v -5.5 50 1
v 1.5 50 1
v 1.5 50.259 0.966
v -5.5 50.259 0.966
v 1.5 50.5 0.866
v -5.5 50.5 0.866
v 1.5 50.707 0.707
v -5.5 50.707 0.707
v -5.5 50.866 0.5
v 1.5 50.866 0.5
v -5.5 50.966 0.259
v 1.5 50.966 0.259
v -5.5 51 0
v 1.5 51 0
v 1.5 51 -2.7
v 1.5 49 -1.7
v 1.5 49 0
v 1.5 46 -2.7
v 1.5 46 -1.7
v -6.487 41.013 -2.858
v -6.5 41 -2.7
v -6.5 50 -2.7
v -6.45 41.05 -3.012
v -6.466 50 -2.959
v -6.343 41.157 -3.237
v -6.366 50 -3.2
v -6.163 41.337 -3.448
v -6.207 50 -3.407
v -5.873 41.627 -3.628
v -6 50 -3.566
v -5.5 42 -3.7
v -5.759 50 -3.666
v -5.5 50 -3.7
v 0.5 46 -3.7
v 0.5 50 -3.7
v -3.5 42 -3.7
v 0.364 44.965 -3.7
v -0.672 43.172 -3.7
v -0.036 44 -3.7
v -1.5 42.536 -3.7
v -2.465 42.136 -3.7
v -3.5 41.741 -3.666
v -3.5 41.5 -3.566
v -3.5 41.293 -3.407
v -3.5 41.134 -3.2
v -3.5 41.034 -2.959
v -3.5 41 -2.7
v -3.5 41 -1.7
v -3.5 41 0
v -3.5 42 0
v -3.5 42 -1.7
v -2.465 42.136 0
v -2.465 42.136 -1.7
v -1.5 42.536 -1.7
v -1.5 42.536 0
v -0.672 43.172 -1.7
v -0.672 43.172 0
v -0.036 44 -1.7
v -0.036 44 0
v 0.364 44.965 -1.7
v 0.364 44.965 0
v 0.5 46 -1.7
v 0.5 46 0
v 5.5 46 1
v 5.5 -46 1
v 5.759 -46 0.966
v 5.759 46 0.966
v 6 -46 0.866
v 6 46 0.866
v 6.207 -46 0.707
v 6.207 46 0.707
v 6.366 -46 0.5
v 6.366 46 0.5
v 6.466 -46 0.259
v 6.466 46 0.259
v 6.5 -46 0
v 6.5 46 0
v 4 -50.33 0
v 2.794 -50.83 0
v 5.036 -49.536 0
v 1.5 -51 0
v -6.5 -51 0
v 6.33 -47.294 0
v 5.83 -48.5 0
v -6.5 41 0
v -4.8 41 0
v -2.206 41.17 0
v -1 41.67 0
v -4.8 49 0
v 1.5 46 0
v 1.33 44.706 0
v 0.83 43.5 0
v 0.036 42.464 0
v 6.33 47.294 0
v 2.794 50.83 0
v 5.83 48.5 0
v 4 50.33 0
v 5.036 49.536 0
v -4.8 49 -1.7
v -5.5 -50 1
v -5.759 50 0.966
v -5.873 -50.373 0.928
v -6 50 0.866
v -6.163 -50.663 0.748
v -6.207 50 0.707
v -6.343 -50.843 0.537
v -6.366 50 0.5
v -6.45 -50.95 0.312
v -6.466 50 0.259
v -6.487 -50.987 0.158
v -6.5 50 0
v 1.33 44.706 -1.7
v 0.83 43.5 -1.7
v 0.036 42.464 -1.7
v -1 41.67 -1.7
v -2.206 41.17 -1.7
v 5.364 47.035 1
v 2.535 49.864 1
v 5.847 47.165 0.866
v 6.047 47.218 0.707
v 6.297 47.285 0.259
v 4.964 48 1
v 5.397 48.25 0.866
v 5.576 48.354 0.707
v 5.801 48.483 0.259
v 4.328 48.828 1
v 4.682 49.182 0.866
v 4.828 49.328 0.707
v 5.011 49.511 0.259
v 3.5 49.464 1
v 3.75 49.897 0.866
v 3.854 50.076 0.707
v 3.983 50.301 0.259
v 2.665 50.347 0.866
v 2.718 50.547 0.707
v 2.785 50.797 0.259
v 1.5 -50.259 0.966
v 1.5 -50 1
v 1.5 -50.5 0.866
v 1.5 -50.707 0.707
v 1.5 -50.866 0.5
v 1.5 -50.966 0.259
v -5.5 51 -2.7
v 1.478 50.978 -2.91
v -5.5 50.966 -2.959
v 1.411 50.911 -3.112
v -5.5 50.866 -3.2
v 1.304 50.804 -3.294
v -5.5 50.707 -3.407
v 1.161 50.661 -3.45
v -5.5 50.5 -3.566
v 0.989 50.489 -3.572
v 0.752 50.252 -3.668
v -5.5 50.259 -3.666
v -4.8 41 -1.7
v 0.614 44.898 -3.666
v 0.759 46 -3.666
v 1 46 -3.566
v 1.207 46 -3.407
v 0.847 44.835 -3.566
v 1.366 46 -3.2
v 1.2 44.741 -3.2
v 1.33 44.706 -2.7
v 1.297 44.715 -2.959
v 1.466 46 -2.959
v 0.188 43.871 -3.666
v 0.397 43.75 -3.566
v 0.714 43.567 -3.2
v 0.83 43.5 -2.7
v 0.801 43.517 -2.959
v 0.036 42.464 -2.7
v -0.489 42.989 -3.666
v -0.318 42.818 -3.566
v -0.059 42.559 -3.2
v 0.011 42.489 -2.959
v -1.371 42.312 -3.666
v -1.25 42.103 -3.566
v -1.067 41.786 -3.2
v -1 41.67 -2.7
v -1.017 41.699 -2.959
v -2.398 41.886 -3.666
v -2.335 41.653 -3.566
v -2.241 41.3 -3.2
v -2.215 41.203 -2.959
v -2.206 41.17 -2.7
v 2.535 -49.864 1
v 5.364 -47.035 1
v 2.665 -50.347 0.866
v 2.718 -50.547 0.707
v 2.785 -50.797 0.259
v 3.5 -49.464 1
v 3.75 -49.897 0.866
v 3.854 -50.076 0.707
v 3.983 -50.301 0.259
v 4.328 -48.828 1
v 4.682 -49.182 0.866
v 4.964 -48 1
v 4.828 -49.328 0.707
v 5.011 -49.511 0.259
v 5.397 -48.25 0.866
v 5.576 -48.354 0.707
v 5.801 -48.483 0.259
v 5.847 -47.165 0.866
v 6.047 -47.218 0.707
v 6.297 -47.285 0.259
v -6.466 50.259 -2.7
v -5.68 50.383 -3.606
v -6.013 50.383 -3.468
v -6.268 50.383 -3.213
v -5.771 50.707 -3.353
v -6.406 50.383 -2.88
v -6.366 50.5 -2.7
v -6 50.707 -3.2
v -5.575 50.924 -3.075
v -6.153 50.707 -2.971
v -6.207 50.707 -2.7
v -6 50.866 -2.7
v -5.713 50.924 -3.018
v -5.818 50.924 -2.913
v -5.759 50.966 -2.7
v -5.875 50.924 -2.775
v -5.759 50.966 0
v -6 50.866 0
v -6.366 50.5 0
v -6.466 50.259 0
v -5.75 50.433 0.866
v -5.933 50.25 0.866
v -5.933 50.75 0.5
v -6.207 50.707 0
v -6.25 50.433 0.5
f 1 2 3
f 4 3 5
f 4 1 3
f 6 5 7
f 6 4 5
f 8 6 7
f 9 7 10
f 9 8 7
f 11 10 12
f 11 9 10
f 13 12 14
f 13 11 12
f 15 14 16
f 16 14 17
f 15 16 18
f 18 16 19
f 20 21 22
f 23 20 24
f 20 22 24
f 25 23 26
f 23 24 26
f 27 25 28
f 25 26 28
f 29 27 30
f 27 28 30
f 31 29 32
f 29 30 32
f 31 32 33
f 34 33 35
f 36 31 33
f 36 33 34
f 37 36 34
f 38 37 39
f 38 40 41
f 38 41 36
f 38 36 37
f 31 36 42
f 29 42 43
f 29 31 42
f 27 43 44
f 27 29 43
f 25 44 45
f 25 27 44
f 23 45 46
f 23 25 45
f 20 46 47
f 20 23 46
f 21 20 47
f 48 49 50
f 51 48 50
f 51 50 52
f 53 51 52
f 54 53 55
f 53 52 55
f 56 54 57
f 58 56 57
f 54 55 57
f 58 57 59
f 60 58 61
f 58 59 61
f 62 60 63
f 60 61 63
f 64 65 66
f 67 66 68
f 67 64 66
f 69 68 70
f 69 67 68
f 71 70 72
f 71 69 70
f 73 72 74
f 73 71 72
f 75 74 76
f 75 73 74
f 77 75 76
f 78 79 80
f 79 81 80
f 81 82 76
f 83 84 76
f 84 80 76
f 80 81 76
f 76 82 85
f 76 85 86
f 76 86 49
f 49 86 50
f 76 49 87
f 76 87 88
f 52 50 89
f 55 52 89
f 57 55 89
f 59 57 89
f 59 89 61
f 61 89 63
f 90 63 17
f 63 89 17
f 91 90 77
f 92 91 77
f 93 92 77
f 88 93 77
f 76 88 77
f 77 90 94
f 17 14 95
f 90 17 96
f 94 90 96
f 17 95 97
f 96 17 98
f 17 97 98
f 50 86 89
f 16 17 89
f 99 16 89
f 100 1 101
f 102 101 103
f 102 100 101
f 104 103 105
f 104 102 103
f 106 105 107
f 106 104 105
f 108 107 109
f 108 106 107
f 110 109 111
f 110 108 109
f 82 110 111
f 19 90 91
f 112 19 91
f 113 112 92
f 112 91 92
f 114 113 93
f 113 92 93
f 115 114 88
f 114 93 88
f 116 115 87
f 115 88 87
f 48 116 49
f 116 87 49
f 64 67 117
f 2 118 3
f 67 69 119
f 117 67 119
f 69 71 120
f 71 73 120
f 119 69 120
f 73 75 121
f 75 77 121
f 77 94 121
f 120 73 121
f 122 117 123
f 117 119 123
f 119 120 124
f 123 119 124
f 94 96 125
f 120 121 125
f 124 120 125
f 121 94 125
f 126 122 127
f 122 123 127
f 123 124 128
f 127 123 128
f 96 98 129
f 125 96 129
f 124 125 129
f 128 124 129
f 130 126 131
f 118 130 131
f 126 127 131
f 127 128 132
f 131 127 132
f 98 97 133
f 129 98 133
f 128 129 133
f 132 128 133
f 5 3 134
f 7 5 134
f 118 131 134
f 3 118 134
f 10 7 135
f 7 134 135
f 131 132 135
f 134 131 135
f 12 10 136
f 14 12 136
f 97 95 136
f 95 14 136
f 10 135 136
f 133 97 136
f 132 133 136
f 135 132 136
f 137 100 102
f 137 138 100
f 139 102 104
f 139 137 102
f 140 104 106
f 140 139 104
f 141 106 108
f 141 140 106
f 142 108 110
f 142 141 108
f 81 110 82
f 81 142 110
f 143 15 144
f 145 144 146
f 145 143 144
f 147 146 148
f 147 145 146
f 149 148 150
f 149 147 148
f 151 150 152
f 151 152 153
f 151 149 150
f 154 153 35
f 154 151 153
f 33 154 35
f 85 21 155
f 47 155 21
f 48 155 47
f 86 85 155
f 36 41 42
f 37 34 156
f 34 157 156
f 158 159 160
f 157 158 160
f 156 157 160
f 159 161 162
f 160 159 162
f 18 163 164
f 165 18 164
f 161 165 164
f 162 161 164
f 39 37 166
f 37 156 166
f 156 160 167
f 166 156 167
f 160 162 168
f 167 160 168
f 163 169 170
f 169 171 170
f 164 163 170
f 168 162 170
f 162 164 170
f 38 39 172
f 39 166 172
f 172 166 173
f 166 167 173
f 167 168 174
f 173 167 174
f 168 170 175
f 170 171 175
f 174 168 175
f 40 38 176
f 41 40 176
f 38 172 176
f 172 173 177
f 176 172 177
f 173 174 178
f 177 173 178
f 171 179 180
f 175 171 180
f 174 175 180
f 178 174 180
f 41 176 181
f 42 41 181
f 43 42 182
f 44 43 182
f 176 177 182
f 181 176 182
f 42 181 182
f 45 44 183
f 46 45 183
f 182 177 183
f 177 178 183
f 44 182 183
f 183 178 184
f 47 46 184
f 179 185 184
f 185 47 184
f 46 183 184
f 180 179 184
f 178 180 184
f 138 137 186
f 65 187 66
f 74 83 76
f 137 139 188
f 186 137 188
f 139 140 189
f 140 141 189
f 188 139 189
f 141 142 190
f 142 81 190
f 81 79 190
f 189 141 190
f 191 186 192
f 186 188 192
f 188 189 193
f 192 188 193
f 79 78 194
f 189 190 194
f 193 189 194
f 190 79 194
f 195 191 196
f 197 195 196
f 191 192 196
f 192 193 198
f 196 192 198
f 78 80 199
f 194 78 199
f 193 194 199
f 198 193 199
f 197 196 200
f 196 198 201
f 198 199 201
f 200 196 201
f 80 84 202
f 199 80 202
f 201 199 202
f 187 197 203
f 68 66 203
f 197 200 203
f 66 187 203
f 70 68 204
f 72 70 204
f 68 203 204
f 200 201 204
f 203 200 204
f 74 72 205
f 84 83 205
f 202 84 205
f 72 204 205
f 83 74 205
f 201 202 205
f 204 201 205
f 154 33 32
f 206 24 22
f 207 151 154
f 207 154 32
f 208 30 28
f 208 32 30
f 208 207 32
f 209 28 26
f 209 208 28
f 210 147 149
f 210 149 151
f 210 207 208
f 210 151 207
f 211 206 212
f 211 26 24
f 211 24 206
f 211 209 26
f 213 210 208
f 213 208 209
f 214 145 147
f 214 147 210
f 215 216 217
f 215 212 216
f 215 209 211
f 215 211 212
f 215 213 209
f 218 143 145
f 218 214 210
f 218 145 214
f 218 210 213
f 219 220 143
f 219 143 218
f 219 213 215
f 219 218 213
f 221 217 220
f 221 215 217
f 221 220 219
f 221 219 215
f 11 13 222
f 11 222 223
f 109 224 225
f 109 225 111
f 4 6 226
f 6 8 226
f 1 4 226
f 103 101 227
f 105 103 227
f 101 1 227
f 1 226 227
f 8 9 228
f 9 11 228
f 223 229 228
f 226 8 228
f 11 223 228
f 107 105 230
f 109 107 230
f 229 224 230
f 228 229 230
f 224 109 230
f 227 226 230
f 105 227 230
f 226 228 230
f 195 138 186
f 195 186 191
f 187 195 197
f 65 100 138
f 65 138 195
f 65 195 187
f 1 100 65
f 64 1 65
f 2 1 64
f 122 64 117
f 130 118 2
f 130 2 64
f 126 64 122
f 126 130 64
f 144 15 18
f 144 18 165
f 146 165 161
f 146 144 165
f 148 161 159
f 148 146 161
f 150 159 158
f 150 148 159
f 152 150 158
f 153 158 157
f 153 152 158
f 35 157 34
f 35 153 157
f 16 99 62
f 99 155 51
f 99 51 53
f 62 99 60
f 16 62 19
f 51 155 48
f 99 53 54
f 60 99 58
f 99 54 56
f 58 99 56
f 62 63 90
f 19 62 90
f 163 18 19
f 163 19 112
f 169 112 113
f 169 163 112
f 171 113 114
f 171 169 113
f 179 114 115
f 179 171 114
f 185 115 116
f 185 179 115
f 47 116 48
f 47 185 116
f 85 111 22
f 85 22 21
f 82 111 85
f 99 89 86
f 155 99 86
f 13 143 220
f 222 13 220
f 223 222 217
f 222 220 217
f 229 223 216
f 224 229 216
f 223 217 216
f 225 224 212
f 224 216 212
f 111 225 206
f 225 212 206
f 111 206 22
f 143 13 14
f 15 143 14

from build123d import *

# Parameters (mm, degrees)
F1_DEPTH     = 1
F2_W         = 1.7
F2_H         = 2
F2_W_2       = 6.3
F2_H_2       = 8
F3_DEPTH     = 1.7
F4_W         = 8
F4_H         = 10
F5_DEPTH     = 2
F6_R         = 5
F7_R         = 0.99999
F8_T1_DEPTH  = 3.7
F8_T3_DEPTH  = 7.5
F8_T5_DEPTH  = 9.5
F8_T7_DEPTH  = 5.5
F8_T9_DEPTH  = 11.5
F8_T12_ANGLE = 90
F8_S15_W     = 1
F8_S15_H     = 1
F8_T16_DEPTH = 1
F8_T20_ANGLE = 90
F10_DEPTH    = 1.7


# Not quite as in the source:
# - a fillet or chamfer that OpenCascade refuses, or shapes differently, is made with other operations: its cross-section is extruded or revolved along the edge and cut away or added
# - a fillet or chamfer is up to 0.001 mm smaller than in the source, because OpenCascade refuses the exact size


with BuildPart() as f1:
    # F0 (on Top) → F1 (new body)
    with BuildSketch(Plane.XY):
        with BuildLine():
            Line((-6.5, -51), (6.5, -51))
            Line((6.5, -51), (6.5, 46))
            ThreePointArc((6.5, 46), (5.0355339059, 49.5355339059), (1.5, 51))
            Line((1.5, 51), (-6.5, 51))
            Line((-6.5, 51), (-6.5, -51))
        make_face()
    extrude(amount=F1_DEPTH)

    # F2 (on face) → F3 (join)
    with BuildSketch(Plane(origin=(0, 0, 0), x_dir=(1, 0, 0), z_dir=(0, 0, -1))):
        with Locations((-5.65, -50)):
            Rectangle(F2_W, F2_H)
        with Locations((-1.65, -50)):
            Rectangle(F2_W_2, F2_H)
        with Locations((-5.65, -45)):
            Rectangle(F2_W, F2_H_2)
    extrude(amount=F3_DEPTH)

    # F4 (on face) → F5 (join)
    with BuildSketch(Plane(origin=(0, 0, -1.7), x_dir=(1, 0, 0), z_dir=(0, 0, -1))):
        with Locations((-2.5, -46)):
            Rectangle(F4_W, F4_H)
    extrude(amount=F5_DEPTH)

    # F6
    f6_edges = [f1.edges().sort_by_distance(p)[0] for p in [
        (6.5, -51, 0.5),
        (1.5, 41, -2.7),
    ]]
    fillet(f6_edges, radius=F6_R)

    # F7 (radius 1 in the source; OpenCascade refuses exactly that, so slightly less here)
    f7_edges = [f1.edges().sort_by_distance(p)[0] for p in [
        (-2.5, -51, 1),
        (5.035534, -49.535534, 1),
        (-6.5, 0, 1),
        (6.5, 0, 1),
        (-2.5, 51, 1),
        (5.035534, 49.535534, 1),
    ]]
    fillet(f7_edges, radius=F7_R)

    # F8: fillet of radius 1 on 6 edges, made by hand

    # F8_s2 → F8_t1 (cut)
    with BuildSketch(Plane.XY.offset(-2.7)):
        with BuildLine():
            ThreePointArc((-5.5, 51), (-6.2071067812, 50.7071067812), (-6.5, 50))
            Line((-6.5, 50), (-6.5, 51))
            Line((-6.5, 51), (-5.5, 51))
        make_face()
    extrude(amount=F8_T1_DEPTH, mode=Mode.SUBTRACT)

    # F8_s4 → F8_t3 (cut)
    with BuildSketch(Plane.XZ.offset(-53.5)):
        with BuildLine():
            ThreePointArc((1.5, -2.7), (1.2071067812, -3.4071067812), (0.5, -3.7))
            Line((0.5, -3.7), (1.5, -3.7))
            Line((1.5, -3.7), (1.5, -2.7))
        make_face()
    extrude(amount=F8_T3_DEPTH, mode=Mode.SUBTRACT)

    # F8_s6 → F8_t5 (cut)
    with BuildSketch(Plane.YZ.offset(-5.5)):
        with BuildLine():
            ThreePointArc((51, -2.7), (50.7071067812, -3.4071067812), (50, -3.7))
            Line((50, -3.7), (51, -3.7))
            Line((51, -3.7), (51, -2.7))
        make_face()
    extrude(amount=F8_T5_DEPTH, mode=Mode.SUBTRACT)

    # F8_s8 → F8_t7 (cut)
    with BuildSketch(Plane.YZ.offset(-9)):
        with BuildLine():
            ThreePointArc((42, -3.7), (41.2928932188, -3.4071067812), (41, -2.7))
            Line((41, -2.7), (41, -3.7))
            Line((41, -3.7), (42, -3.7))
        make_face()
    extrude(amount=F8_T7_DEPTH, mode=Mode.SUBTRACT)

    # F8_s10 → F8_t9 (cut)
    with BuildSketch(Plane.XZ.offset(-50)):
        with BuildLine():
            ThreePointArc((-6.5, -2.7), (-6.2071067812, -3.4071067812), (-5.5, -3.7))
            Line((-5.5, -3.7), (-6.5, -3.7))
            Line((-6.5, -3.7), (-6.5, -2.7))
        make_face()
    extrude(amount=F8_T9_DEPTH, mode=Mode.SUBTRACT)

    # F8_s11 → F8_t12 (revolve, cut)
    with BuildSketch(Plane.YZ.offset(-5.5)):
        with BuildLine():
            ThreePointArc((50.00001, 1), (50.7071097101, 0.7071097101), (51, 1e-05))
            Line((51, 1e-05), (51, 1))
            Line((51, 1), (50.00001, 1))
        make_face()
    revolve(axis=Axis((-5.5, 50, 1), (0, 0, 1)), revolution_arc=F8_T12_ANGLE, mode=Mode.SUBTRACT)


with BuildPart() as f8_tool14:
    # F8_s15 → F8_t16 (new body)
    with BuildSketch(Plane.XZ.offset(-50)):
        with Locations((-6, -3.2)):
            Rectangle(F8_S15_W, F8_S15_H)
    extrude(amount=-F8_T16_DEPTH)

    # F8_s17 → F8_t18 (revolve, cut)
    with BuildSketch(Plane(origin=(-5.5, 50, -2.7), x_dir=(0.7071067812, 0, 0.7071067812), z_dir=(-0.7071067812, 0, 0.7071067812))):
        with BuildLine():
            ThreePointArc((0, -1), (1, 0), (0, 1))
            Line((0, 1), (0, -1))
        make_face()
    revolve(axis=Axis((-5.5, 50, -2.7), (0, 1, 0)), mode=Mode.SUBTRACT)


with BuildPart() as f1_1:
    add(f1.part)

    # F8_t13: cut F8_tool14
    add(f8_tool14.part, mode=Mode.SUBTRACT)

    # F8_s19 → F8_t20 (revolve, cut)
    with BuildSketch(Plane.XZ.offset(-46)):
        with BuildLine():
            ThreePointArc((0.5, -3.7), (1.2071067812, -3.4071067812), (1.5, -2.7))
            Line((1.5, -2.7), (1.5, -3.7))
            Line((1.5, -3.7), (0.5, -3.7))
        make_face()
    revolve(axis=Axis((-3.5, 46, -3.7), (0, 0, -1)), revolution_arc=F8_T20_ANGLE, mode=Mode.SUBTRACT)

    # F9 (on face) → F10 (join, through all)
    with BuildSketch(Plane(origin=(0, 0, 0), x_dir=(1, 0, 0), z_dir=(0, 0, -1))):
        with BuildLine():
            ThreePointArc((-3.5, -42), (-0.6715728753, -43.1715728753), (0.5, -46))
            Line((0.5, -46), (1.5, -46))
            ThreePointArc((1.5, -46), (0.0355339059, -42.4644660941), (-3.5, -41))
            Line((-3.5, -41), (-3.5, -42))
        make_face()
    extrude(amount=F10_DEPTH)


solid = f1_1.part
